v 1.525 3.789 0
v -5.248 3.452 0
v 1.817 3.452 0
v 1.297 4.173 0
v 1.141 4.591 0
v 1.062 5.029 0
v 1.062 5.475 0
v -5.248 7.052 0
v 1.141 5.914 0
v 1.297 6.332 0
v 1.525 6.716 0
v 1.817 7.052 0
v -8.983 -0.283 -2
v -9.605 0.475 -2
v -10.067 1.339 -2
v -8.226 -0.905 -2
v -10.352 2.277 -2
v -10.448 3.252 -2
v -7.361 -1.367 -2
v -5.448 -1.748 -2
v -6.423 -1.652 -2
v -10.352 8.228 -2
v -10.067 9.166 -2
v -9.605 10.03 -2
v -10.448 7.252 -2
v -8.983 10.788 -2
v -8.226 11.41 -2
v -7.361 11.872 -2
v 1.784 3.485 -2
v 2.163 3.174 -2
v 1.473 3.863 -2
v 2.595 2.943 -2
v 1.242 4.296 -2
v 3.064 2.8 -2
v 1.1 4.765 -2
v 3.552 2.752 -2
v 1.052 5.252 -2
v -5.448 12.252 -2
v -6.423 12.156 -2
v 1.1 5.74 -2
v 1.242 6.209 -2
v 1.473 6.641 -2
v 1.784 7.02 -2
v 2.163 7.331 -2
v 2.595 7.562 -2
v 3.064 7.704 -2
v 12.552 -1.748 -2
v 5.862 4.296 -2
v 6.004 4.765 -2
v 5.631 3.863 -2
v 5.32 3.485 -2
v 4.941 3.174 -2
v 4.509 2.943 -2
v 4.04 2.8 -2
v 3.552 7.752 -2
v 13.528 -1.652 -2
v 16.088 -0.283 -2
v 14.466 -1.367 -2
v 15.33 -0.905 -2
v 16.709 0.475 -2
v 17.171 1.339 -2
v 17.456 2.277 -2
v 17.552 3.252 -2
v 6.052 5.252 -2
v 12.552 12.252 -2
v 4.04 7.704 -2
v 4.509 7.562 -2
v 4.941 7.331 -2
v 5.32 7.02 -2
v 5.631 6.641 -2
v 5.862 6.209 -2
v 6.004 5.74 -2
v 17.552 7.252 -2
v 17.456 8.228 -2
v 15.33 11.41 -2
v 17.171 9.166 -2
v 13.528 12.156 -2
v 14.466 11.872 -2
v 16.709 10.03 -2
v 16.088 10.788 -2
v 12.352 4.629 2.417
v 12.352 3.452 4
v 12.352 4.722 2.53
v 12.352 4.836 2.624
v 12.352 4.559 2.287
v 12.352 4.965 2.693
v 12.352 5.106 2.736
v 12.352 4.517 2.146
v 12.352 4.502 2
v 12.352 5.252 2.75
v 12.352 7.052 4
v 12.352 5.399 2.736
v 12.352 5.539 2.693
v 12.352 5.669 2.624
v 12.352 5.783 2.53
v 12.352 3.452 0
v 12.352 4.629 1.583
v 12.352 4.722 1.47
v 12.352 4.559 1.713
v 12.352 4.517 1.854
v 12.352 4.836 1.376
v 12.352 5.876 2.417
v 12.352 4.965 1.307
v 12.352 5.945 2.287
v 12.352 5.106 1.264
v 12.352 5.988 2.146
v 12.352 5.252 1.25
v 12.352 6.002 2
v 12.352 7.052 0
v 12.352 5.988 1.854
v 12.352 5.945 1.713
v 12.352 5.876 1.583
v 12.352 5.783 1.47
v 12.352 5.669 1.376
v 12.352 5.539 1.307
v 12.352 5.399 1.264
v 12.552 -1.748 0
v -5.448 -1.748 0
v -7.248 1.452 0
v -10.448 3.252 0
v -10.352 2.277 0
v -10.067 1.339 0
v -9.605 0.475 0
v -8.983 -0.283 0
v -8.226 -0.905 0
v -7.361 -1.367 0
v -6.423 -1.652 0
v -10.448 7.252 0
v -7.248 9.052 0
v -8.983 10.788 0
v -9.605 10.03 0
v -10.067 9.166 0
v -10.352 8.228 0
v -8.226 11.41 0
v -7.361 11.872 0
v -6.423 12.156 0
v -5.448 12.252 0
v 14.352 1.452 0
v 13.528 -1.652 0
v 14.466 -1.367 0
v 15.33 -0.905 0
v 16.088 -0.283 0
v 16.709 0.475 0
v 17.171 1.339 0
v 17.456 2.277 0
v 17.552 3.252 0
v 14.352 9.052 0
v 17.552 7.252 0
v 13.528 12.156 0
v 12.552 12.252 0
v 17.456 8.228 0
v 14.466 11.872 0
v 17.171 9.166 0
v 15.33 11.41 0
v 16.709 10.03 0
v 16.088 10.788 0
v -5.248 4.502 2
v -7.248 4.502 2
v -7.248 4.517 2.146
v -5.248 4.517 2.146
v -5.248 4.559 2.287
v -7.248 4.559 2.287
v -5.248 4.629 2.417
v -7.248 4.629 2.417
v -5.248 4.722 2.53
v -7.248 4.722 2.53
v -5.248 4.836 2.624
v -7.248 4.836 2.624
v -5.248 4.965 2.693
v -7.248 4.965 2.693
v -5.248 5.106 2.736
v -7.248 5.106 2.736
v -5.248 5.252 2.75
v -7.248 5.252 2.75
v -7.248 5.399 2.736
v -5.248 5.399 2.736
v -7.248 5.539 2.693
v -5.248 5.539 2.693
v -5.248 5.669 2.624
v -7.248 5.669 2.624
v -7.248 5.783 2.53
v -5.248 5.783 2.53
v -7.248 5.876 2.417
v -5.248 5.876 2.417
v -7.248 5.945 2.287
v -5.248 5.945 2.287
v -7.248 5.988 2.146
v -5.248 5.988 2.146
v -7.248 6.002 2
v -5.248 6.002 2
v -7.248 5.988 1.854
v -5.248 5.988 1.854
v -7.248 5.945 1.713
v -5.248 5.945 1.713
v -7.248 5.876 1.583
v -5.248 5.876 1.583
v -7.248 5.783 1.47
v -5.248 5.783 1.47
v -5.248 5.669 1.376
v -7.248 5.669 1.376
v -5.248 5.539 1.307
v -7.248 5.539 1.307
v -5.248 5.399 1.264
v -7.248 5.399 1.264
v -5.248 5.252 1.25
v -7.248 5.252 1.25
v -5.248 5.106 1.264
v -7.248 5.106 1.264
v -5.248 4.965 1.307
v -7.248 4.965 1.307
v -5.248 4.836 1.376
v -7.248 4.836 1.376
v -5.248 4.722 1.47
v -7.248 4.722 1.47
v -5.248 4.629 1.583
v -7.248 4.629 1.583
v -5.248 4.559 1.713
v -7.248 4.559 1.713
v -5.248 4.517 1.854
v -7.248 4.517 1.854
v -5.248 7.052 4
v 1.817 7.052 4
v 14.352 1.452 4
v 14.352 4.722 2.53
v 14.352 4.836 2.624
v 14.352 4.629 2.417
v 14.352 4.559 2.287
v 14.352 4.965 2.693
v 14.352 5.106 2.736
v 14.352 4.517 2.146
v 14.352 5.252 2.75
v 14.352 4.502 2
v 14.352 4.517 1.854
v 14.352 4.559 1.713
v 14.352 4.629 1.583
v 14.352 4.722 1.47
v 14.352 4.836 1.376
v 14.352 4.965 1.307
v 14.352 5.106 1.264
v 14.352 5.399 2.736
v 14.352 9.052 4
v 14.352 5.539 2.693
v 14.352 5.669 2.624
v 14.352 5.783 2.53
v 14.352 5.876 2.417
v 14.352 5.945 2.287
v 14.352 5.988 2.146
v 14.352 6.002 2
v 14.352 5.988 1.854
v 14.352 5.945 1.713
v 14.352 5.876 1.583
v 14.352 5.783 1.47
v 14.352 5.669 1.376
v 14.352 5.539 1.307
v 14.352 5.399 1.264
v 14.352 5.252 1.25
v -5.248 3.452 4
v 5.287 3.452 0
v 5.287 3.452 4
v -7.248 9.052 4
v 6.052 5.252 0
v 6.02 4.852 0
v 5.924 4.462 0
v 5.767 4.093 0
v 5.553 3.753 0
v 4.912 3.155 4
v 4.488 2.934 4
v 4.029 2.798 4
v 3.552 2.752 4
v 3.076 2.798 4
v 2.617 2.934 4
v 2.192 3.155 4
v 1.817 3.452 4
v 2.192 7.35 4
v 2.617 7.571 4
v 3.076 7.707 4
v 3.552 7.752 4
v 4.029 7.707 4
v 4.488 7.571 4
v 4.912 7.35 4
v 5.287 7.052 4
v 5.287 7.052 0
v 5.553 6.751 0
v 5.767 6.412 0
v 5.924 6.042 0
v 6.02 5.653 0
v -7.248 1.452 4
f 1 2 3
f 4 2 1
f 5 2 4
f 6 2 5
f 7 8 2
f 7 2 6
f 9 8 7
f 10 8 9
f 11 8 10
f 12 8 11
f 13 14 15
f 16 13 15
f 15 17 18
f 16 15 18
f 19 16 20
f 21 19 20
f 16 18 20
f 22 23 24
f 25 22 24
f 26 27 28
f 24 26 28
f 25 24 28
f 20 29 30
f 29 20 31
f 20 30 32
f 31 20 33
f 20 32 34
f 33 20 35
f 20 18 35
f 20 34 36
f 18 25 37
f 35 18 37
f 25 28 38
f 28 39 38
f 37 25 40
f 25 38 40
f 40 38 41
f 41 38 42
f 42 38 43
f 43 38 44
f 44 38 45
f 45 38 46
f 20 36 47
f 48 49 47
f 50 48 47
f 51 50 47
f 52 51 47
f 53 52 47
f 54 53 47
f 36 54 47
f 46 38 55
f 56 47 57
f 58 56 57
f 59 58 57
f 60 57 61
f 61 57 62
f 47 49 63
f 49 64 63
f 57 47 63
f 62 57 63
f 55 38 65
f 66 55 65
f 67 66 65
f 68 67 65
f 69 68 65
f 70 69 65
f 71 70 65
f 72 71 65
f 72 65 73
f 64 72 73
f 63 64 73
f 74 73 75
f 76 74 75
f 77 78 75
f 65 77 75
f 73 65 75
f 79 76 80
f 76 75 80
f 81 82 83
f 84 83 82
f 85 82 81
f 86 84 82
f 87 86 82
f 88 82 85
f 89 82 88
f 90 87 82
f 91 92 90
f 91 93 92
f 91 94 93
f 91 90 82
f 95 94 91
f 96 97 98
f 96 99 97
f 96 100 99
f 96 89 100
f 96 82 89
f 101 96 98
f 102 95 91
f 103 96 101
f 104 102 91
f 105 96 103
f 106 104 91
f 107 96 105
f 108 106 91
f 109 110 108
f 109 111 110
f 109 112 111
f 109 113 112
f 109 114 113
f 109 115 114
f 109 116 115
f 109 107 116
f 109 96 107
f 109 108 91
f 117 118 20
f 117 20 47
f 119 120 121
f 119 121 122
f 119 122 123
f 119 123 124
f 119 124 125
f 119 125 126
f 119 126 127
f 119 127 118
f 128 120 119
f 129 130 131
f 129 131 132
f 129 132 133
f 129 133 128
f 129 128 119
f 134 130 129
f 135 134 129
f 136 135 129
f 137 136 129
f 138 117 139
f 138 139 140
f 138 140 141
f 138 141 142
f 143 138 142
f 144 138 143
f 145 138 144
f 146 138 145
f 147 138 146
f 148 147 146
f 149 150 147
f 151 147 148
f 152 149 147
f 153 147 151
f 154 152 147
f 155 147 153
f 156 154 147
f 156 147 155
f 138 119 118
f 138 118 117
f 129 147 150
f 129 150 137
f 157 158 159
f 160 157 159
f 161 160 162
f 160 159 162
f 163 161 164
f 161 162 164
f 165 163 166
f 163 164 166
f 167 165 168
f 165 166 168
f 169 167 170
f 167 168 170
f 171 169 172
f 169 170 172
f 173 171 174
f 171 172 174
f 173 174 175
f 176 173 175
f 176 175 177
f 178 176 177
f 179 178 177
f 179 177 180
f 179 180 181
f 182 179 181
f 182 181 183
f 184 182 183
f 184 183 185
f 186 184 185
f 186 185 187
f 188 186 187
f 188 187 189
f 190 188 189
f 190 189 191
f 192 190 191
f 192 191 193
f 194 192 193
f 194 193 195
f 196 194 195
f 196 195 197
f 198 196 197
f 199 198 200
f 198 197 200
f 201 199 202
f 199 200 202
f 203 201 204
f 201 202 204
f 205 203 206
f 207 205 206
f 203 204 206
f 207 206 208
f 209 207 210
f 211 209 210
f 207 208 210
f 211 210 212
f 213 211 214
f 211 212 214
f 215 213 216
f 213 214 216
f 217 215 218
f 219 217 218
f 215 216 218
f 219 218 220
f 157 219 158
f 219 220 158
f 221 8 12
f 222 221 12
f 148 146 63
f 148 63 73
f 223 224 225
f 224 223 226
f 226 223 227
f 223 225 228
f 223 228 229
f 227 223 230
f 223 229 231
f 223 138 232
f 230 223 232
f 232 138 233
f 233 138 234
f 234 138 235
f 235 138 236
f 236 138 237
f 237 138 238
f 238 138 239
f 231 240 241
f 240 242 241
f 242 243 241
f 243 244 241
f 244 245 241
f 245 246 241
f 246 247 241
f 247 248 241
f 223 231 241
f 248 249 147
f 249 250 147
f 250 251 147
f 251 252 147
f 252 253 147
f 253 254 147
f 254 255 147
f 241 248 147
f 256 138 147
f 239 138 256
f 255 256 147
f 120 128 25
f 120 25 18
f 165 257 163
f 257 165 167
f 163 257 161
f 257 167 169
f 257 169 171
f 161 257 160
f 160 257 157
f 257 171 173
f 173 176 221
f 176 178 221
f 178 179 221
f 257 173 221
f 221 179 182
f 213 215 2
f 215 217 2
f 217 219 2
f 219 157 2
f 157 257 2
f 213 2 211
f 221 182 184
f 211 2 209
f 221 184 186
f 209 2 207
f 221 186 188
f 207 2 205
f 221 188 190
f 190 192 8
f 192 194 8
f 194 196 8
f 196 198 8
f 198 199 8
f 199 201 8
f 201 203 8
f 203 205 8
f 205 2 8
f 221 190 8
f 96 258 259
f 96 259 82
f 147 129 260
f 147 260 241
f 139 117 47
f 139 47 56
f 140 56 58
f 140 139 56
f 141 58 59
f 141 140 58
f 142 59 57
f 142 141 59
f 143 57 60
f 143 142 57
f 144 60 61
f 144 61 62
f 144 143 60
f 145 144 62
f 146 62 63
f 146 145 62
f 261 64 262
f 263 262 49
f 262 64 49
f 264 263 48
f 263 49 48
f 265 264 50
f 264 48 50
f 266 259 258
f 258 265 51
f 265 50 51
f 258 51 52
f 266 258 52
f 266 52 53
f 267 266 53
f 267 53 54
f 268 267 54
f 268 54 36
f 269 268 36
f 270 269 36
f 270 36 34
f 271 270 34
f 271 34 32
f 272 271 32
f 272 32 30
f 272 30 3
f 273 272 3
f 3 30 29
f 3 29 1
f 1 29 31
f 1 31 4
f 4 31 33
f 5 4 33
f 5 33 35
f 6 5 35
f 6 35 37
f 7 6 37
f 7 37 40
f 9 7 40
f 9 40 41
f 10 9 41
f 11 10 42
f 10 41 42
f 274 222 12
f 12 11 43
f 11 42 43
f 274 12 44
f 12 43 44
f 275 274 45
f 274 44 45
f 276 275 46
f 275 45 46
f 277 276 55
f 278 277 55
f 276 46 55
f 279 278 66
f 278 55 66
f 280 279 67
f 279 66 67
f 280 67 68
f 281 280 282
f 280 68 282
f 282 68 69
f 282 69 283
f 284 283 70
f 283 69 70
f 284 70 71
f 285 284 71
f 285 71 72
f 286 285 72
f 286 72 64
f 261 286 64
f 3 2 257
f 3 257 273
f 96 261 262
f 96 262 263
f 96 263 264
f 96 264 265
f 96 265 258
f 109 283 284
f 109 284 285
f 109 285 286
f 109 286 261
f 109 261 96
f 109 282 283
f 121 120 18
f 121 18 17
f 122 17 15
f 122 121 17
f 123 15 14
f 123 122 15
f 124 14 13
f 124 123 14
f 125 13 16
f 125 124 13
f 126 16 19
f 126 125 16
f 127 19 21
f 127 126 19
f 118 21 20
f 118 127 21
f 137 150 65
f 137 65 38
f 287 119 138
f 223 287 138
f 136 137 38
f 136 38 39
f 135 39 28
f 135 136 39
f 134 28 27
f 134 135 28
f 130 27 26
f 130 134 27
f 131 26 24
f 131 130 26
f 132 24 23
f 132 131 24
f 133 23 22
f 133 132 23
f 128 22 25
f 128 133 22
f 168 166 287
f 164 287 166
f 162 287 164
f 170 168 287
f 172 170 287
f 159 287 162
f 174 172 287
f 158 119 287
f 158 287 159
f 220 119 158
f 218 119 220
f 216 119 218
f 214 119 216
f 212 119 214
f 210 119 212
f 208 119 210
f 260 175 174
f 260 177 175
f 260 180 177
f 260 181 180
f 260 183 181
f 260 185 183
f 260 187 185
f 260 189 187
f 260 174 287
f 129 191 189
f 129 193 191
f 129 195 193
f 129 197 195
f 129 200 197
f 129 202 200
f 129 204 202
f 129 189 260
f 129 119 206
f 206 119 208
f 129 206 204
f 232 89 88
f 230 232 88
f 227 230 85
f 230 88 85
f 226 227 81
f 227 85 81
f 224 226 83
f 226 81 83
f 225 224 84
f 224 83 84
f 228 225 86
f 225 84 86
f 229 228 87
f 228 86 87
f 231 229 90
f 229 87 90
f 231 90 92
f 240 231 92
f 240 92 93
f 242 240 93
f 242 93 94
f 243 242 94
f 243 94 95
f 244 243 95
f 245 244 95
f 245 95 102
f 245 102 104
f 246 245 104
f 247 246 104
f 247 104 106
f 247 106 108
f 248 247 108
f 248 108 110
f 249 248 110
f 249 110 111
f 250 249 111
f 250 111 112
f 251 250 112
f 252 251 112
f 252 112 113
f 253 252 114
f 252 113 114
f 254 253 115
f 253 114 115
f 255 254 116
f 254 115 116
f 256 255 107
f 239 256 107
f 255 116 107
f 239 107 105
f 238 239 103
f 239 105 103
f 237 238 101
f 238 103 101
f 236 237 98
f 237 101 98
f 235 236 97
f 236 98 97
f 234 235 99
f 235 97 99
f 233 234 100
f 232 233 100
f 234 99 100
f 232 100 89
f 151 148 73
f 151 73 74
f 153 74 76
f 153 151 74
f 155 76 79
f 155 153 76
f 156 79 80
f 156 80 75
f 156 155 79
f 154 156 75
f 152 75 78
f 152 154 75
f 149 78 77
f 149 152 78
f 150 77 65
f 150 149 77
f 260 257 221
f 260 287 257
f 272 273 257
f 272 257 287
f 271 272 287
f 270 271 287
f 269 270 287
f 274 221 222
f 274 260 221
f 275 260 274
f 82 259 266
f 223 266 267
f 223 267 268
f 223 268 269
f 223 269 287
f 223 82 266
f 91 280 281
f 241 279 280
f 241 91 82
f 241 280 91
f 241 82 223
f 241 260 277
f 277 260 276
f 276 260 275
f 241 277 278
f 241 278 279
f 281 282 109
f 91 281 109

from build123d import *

# Parameters (mm, degrees)
F0_W          = 22
F0_H          = 8
F0_W_2        = 21.6
F0_H_2        = 7.6
F0_W_3        = 17.6
F0_H_3        = 3.6
F1_DEPTH      = 2
F2_DEPTH      = 4
F3_R          = 2.5
F4_DEPTH      = 10
F4_DEPTH_BACK = 10
F5_R          = 0.75
F6_DEPTH      = 24.801
F6_DEPTH_BACK = 3.201


with BuildPart() as f1:
    # F0 (on Top) → F1 (new body)
    with BuildSketch(Plane.XY):
        with BuildLine():
            Line((17.5520906094, 3.2524078637), (17.5520906094, 7.2524078637))
            ThreePointArc((17.5520906094, 7.2524078637), (16.0876245154, 10.7879417697), (12.5520906094, 12.2524078637))
            Line((12.5520906094, 12.2524078637), (-5.4479093906, 12.2524078637))
            ThreePointArc((-5.4479093906, 12.2524078637), (-8.9834432965, 10.7879417697), (-10.4479093906, 7.2524078637))
            Line((-10.4479093906, 7.2524078637), (-10.4479093906, 3.2524078637))
            ThreePointArc((-10.4479093906, 3.2524078637), (-8.9834432965, -0.2831260422), (-5.4479093906, -1.7475921363))
            Line((-5.4479093906, -1.7475921363), (12.5520906094, -1.7475921363))
            ThreePointArc((12.5520906094, -1.7475921363), (16.0876245154, -0.2831260422), (17.5520906094, 3.2524078637))
        make_face()
        with Locations((3.5520906094, 5.2524078637)):
            Rectangle(F0_W, F0_H, mode=Mode.SUBTRACT)
        with Locations((3.5520906094, 5.2524078637)):
            Rectangle(F0_W, F0_H)
        with Locations((3.5520906094, 5.2524078637)):
            Rectangle(F0_W_2, F0_H_2, mode=Mode.SUBTRACT)
        with Locations((3.5520906094, 5.2524078637)):
            Rectangle(F0_W_2, F0_H_2)
        with Locations((3.5520906094, 5.2524078637)):
            Rectangle(F0_W_3, F0_H_3, mode=Mode.SUBTRACT)
        with Locations((3.5520906094, 5.2524078637)):
            Rectangle(F0_W_3, F0_H_3)
    extrude(amount=-F1_DEPTH)

    # F0 (on Top) → F2 (join)
    with BuildSketch(Plane.XY):
        with Locations((3.5520906094, 5.2524078637)):
            Rectangle(F0_W_2, F0_H_2)
        with Locations((3.5520906094, 5.2524078637)):
            Rectangle(F0_W_3, F0_H_3, mode=Mode.SUBTRACT)
    extrude(amount=F2_DEPTH)

    # F3 (on face) → F4 (cut, two sides)
    with BuildSketch(Plane(origin=(0, 0, -2), x_dir=(1, 0, 0), z_dir=(0, 0, -1))) as f4_sk:
        with Locations((3.5520906094, -5.2524078637)):
            Circle(F3_R)
    extrude(amount=-F4_DEPTH, mode=Mode.SUBTRACT)
    extrude(f4_sk.sketch, amount=F4_DEPTH_BACK, mode=Mode.SUBTRACT)

    # F5 (on face) → F6 (cut, two sides)
    with BuildSketch(Plane(origin=(-7.2479093906, 0, 0), x_dir=(0, -1, 0), z_dir=(-1, 0, 0))) as f6_sk:
        with Locations((-5.2524078637, 2)):
            Circle(F5_R)
    extrude(amount=-F6_DEPTH, mode=Mode.SUBTRACT)
    extrude(f6_sk.sketch, amount=F6_DEPTH_BACK, mode=Mode.SUBTRACT)


solid = f1.part
